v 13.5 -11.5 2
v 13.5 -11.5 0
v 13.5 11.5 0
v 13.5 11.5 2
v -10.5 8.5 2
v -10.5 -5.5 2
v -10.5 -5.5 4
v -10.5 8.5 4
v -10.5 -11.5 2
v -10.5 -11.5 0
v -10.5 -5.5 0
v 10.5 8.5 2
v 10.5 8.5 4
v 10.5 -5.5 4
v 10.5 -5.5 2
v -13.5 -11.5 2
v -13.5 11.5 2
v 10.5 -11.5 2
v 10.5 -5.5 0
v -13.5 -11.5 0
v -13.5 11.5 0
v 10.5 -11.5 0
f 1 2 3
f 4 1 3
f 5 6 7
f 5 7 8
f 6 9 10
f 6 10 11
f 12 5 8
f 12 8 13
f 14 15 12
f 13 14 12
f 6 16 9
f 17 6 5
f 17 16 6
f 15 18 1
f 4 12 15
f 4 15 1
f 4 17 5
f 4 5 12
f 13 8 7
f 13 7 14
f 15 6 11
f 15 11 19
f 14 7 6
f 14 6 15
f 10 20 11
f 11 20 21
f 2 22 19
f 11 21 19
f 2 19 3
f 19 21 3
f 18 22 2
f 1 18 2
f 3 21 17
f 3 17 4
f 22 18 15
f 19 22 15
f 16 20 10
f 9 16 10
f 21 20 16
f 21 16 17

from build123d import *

# Parameters (mm, degrees)
SKETCH1_W           = 27
SKETCH1_H           = 23
BOSS_EXTRUDE1_DEPTH = 2
SKETCH2_W           = 21
SKETCH2_H           = 14
BOSS_EXTRUDE2_DEPTH = 2
SKETCH3_W           = 21
SKETCH3_H           = 6
CUT_EXTRUDE1_DEPTH  = 2


with BuildPart() as part:
    # Sketch1 → Boss-Extrude1 (new body)
    with BuildSketch(Plane.XY):
        Rectangle(SKETCH1_W, SKETCH1_H)
    extrude(amount=BOSS_EXTRUDE1_DEPTH)

    # Sketch2 → Boss-Extrude2 (add)
    with BuildSketch(Plane.XY.offset(2)):
        with Locations((0, 1.5)):
            Rectangle(SKETCH2_W, SKETCH2_H)
    extrude(amount=BOSS_EXTRUDE2_DEPTH)

    # Sketch3 → Cut-Extrude1 (cut)
    with BuildSketch(Plane.XY.offset(2)):
        with Locations((0, -8.5)):
            Rectangle(SKETCH3_W, SKETCH3_H)
    extrude(amount=-CUT_EXTRUDE1_DEPTH, mode=Mode.SUBTRACT)


solid = part.part
